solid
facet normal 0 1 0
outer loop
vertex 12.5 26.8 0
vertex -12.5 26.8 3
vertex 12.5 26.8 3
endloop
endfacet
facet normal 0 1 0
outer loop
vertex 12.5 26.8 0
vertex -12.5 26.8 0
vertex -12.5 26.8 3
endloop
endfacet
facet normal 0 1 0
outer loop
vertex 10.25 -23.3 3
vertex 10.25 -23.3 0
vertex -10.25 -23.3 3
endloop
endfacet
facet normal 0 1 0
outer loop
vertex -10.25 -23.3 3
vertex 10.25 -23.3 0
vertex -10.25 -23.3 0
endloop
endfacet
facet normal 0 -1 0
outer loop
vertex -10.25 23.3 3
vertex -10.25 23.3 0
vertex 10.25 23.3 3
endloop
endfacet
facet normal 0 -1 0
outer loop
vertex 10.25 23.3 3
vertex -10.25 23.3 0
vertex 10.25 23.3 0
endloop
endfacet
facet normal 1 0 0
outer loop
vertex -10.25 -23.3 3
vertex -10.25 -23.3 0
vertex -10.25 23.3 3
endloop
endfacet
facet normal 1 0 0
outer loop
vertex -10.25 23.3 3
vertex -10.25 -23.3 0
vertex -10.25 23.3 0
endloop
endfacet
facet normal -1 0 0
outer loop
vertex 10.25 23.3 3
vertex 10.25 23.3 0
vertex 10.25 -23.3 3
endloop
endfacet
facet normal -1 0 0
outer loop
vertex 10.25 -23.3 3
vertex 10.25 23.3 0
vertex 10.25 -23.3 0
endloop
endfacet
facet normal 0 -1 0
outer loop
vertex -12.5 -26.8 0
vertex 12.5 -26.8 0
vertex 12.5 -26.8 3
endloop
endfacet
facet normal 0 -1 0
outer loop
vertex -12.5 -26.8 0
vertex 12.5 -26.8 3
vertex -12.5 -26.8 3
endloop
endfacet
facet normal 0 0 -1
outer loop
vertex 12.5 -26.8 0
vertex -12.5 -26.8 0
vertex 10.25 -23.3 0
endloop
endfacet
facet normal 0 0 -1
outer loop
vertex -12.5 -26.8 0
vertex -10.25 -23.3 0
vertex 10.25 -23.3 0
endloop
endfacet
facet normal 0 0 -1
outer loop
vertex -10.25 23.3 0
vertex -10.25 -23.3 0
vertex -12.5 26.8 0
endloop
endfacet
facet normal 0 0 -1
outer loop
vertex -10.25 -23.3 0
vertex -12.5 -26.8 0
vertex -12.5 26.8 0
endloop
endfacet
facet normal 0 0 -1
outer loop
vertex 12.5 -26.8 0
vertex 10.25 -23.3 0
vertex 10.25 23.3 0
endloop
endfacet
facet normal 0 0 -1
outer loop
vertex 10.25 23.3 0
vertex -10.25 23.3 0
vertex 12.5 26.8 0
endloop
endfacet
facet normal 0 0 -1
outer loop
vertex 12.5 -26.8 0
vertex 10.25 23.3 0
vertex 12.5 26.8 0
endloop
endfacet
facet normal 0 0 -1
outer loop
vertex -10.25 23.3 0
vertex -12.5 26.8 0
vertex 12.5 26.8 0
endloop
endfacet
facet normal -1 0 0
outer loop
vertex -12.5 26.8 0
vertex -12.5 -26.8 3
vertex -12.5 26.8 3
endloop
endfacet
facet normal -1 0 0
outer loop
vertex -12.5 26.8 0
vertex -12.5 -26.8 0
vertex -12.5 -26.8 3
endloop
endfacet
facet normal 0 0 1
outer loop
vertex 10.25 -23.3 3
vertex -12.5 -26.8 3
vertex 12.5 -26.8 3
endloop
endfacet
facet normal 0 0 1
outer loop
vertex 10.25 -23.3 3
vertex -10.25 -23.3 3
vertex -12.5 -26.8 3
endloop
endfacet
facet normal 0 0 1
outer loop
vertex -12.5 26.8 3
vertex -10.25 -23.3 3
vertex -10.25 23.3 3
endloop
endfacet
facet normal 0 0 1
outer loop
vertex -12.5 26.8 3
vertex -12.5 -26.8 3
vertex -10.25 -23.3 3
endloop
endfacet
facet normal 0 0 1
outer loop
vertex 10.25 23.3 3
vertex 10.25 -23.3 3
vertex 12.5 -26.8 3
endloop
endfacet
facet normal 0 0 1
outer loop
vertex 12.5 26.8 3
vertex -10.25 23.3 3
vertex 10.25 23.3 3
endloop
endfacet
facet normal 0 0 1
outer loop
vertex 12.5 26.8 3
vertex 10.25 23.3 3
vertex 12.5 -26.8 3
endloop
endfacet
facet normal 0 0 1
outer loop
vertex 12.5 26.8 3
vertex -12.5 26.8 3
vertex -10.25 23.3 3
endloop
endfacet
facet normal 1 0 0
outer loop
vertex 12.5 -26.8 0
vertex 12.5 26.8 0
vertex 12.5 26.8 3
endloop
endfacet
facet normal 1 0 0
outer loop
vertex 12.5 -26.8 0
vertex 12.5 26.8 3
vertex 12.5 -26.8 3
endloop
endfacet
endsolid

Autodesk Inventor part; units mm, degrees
ref_plane "YZ Plane" through (0, 0, 0) normal (1, 0, 0) x (0, 1, 0)
ref_plane "XZ Plane" through (0, 0, 0) normal (0, 1, 0) x (-1, 0, 0)
ref_plane "XY Plane" through (0, 0, 0) normal (0, 0, 1) x (1, 0, 0)
sketch "Sketch1" plane through (0, 0, 0) normal (0, 0, 1) x (1, 0, 0)
  line L0 (-17.5, 0) -> (17.5, 0) construction
  line L1 (0, -37.52) -> (0, 37.52) construction
  line L2 (-12.5, 26.8) -> (12.5, 26.8)
  line L3 (12.5, 26.8) -> (12.5, -26.8)
  line L4 (12.5, -26.8) -> (-12.5, -26.8)
  line L5 (-12.5, -26.8) -> (-12.5, 26.8)
  line L6 (-10.25, 23.3) -> (10.25, 23.3)
  line L7 (10.25, 23.3) -> (10.25, -23.3)
  line L8 (10.25, -23.3) -> (-10.25, -23.3)
  line L9 (-10.25, -23.3) -> (-10.25, 23.3)
  point P0 (0, 0)
  dimension "d0" = 20.5
  dimension "d1" = 25
  dimension "d3" = 46.6
  dimension "d8" = 3.5
  dimension "d9" = 3.5
  dimension "d10" = 53.6
extrude "Extrusion1" add sketch "Sketch1" along normal blind 3
properties part number "20_Cube_Insert_Sample_clamp"
